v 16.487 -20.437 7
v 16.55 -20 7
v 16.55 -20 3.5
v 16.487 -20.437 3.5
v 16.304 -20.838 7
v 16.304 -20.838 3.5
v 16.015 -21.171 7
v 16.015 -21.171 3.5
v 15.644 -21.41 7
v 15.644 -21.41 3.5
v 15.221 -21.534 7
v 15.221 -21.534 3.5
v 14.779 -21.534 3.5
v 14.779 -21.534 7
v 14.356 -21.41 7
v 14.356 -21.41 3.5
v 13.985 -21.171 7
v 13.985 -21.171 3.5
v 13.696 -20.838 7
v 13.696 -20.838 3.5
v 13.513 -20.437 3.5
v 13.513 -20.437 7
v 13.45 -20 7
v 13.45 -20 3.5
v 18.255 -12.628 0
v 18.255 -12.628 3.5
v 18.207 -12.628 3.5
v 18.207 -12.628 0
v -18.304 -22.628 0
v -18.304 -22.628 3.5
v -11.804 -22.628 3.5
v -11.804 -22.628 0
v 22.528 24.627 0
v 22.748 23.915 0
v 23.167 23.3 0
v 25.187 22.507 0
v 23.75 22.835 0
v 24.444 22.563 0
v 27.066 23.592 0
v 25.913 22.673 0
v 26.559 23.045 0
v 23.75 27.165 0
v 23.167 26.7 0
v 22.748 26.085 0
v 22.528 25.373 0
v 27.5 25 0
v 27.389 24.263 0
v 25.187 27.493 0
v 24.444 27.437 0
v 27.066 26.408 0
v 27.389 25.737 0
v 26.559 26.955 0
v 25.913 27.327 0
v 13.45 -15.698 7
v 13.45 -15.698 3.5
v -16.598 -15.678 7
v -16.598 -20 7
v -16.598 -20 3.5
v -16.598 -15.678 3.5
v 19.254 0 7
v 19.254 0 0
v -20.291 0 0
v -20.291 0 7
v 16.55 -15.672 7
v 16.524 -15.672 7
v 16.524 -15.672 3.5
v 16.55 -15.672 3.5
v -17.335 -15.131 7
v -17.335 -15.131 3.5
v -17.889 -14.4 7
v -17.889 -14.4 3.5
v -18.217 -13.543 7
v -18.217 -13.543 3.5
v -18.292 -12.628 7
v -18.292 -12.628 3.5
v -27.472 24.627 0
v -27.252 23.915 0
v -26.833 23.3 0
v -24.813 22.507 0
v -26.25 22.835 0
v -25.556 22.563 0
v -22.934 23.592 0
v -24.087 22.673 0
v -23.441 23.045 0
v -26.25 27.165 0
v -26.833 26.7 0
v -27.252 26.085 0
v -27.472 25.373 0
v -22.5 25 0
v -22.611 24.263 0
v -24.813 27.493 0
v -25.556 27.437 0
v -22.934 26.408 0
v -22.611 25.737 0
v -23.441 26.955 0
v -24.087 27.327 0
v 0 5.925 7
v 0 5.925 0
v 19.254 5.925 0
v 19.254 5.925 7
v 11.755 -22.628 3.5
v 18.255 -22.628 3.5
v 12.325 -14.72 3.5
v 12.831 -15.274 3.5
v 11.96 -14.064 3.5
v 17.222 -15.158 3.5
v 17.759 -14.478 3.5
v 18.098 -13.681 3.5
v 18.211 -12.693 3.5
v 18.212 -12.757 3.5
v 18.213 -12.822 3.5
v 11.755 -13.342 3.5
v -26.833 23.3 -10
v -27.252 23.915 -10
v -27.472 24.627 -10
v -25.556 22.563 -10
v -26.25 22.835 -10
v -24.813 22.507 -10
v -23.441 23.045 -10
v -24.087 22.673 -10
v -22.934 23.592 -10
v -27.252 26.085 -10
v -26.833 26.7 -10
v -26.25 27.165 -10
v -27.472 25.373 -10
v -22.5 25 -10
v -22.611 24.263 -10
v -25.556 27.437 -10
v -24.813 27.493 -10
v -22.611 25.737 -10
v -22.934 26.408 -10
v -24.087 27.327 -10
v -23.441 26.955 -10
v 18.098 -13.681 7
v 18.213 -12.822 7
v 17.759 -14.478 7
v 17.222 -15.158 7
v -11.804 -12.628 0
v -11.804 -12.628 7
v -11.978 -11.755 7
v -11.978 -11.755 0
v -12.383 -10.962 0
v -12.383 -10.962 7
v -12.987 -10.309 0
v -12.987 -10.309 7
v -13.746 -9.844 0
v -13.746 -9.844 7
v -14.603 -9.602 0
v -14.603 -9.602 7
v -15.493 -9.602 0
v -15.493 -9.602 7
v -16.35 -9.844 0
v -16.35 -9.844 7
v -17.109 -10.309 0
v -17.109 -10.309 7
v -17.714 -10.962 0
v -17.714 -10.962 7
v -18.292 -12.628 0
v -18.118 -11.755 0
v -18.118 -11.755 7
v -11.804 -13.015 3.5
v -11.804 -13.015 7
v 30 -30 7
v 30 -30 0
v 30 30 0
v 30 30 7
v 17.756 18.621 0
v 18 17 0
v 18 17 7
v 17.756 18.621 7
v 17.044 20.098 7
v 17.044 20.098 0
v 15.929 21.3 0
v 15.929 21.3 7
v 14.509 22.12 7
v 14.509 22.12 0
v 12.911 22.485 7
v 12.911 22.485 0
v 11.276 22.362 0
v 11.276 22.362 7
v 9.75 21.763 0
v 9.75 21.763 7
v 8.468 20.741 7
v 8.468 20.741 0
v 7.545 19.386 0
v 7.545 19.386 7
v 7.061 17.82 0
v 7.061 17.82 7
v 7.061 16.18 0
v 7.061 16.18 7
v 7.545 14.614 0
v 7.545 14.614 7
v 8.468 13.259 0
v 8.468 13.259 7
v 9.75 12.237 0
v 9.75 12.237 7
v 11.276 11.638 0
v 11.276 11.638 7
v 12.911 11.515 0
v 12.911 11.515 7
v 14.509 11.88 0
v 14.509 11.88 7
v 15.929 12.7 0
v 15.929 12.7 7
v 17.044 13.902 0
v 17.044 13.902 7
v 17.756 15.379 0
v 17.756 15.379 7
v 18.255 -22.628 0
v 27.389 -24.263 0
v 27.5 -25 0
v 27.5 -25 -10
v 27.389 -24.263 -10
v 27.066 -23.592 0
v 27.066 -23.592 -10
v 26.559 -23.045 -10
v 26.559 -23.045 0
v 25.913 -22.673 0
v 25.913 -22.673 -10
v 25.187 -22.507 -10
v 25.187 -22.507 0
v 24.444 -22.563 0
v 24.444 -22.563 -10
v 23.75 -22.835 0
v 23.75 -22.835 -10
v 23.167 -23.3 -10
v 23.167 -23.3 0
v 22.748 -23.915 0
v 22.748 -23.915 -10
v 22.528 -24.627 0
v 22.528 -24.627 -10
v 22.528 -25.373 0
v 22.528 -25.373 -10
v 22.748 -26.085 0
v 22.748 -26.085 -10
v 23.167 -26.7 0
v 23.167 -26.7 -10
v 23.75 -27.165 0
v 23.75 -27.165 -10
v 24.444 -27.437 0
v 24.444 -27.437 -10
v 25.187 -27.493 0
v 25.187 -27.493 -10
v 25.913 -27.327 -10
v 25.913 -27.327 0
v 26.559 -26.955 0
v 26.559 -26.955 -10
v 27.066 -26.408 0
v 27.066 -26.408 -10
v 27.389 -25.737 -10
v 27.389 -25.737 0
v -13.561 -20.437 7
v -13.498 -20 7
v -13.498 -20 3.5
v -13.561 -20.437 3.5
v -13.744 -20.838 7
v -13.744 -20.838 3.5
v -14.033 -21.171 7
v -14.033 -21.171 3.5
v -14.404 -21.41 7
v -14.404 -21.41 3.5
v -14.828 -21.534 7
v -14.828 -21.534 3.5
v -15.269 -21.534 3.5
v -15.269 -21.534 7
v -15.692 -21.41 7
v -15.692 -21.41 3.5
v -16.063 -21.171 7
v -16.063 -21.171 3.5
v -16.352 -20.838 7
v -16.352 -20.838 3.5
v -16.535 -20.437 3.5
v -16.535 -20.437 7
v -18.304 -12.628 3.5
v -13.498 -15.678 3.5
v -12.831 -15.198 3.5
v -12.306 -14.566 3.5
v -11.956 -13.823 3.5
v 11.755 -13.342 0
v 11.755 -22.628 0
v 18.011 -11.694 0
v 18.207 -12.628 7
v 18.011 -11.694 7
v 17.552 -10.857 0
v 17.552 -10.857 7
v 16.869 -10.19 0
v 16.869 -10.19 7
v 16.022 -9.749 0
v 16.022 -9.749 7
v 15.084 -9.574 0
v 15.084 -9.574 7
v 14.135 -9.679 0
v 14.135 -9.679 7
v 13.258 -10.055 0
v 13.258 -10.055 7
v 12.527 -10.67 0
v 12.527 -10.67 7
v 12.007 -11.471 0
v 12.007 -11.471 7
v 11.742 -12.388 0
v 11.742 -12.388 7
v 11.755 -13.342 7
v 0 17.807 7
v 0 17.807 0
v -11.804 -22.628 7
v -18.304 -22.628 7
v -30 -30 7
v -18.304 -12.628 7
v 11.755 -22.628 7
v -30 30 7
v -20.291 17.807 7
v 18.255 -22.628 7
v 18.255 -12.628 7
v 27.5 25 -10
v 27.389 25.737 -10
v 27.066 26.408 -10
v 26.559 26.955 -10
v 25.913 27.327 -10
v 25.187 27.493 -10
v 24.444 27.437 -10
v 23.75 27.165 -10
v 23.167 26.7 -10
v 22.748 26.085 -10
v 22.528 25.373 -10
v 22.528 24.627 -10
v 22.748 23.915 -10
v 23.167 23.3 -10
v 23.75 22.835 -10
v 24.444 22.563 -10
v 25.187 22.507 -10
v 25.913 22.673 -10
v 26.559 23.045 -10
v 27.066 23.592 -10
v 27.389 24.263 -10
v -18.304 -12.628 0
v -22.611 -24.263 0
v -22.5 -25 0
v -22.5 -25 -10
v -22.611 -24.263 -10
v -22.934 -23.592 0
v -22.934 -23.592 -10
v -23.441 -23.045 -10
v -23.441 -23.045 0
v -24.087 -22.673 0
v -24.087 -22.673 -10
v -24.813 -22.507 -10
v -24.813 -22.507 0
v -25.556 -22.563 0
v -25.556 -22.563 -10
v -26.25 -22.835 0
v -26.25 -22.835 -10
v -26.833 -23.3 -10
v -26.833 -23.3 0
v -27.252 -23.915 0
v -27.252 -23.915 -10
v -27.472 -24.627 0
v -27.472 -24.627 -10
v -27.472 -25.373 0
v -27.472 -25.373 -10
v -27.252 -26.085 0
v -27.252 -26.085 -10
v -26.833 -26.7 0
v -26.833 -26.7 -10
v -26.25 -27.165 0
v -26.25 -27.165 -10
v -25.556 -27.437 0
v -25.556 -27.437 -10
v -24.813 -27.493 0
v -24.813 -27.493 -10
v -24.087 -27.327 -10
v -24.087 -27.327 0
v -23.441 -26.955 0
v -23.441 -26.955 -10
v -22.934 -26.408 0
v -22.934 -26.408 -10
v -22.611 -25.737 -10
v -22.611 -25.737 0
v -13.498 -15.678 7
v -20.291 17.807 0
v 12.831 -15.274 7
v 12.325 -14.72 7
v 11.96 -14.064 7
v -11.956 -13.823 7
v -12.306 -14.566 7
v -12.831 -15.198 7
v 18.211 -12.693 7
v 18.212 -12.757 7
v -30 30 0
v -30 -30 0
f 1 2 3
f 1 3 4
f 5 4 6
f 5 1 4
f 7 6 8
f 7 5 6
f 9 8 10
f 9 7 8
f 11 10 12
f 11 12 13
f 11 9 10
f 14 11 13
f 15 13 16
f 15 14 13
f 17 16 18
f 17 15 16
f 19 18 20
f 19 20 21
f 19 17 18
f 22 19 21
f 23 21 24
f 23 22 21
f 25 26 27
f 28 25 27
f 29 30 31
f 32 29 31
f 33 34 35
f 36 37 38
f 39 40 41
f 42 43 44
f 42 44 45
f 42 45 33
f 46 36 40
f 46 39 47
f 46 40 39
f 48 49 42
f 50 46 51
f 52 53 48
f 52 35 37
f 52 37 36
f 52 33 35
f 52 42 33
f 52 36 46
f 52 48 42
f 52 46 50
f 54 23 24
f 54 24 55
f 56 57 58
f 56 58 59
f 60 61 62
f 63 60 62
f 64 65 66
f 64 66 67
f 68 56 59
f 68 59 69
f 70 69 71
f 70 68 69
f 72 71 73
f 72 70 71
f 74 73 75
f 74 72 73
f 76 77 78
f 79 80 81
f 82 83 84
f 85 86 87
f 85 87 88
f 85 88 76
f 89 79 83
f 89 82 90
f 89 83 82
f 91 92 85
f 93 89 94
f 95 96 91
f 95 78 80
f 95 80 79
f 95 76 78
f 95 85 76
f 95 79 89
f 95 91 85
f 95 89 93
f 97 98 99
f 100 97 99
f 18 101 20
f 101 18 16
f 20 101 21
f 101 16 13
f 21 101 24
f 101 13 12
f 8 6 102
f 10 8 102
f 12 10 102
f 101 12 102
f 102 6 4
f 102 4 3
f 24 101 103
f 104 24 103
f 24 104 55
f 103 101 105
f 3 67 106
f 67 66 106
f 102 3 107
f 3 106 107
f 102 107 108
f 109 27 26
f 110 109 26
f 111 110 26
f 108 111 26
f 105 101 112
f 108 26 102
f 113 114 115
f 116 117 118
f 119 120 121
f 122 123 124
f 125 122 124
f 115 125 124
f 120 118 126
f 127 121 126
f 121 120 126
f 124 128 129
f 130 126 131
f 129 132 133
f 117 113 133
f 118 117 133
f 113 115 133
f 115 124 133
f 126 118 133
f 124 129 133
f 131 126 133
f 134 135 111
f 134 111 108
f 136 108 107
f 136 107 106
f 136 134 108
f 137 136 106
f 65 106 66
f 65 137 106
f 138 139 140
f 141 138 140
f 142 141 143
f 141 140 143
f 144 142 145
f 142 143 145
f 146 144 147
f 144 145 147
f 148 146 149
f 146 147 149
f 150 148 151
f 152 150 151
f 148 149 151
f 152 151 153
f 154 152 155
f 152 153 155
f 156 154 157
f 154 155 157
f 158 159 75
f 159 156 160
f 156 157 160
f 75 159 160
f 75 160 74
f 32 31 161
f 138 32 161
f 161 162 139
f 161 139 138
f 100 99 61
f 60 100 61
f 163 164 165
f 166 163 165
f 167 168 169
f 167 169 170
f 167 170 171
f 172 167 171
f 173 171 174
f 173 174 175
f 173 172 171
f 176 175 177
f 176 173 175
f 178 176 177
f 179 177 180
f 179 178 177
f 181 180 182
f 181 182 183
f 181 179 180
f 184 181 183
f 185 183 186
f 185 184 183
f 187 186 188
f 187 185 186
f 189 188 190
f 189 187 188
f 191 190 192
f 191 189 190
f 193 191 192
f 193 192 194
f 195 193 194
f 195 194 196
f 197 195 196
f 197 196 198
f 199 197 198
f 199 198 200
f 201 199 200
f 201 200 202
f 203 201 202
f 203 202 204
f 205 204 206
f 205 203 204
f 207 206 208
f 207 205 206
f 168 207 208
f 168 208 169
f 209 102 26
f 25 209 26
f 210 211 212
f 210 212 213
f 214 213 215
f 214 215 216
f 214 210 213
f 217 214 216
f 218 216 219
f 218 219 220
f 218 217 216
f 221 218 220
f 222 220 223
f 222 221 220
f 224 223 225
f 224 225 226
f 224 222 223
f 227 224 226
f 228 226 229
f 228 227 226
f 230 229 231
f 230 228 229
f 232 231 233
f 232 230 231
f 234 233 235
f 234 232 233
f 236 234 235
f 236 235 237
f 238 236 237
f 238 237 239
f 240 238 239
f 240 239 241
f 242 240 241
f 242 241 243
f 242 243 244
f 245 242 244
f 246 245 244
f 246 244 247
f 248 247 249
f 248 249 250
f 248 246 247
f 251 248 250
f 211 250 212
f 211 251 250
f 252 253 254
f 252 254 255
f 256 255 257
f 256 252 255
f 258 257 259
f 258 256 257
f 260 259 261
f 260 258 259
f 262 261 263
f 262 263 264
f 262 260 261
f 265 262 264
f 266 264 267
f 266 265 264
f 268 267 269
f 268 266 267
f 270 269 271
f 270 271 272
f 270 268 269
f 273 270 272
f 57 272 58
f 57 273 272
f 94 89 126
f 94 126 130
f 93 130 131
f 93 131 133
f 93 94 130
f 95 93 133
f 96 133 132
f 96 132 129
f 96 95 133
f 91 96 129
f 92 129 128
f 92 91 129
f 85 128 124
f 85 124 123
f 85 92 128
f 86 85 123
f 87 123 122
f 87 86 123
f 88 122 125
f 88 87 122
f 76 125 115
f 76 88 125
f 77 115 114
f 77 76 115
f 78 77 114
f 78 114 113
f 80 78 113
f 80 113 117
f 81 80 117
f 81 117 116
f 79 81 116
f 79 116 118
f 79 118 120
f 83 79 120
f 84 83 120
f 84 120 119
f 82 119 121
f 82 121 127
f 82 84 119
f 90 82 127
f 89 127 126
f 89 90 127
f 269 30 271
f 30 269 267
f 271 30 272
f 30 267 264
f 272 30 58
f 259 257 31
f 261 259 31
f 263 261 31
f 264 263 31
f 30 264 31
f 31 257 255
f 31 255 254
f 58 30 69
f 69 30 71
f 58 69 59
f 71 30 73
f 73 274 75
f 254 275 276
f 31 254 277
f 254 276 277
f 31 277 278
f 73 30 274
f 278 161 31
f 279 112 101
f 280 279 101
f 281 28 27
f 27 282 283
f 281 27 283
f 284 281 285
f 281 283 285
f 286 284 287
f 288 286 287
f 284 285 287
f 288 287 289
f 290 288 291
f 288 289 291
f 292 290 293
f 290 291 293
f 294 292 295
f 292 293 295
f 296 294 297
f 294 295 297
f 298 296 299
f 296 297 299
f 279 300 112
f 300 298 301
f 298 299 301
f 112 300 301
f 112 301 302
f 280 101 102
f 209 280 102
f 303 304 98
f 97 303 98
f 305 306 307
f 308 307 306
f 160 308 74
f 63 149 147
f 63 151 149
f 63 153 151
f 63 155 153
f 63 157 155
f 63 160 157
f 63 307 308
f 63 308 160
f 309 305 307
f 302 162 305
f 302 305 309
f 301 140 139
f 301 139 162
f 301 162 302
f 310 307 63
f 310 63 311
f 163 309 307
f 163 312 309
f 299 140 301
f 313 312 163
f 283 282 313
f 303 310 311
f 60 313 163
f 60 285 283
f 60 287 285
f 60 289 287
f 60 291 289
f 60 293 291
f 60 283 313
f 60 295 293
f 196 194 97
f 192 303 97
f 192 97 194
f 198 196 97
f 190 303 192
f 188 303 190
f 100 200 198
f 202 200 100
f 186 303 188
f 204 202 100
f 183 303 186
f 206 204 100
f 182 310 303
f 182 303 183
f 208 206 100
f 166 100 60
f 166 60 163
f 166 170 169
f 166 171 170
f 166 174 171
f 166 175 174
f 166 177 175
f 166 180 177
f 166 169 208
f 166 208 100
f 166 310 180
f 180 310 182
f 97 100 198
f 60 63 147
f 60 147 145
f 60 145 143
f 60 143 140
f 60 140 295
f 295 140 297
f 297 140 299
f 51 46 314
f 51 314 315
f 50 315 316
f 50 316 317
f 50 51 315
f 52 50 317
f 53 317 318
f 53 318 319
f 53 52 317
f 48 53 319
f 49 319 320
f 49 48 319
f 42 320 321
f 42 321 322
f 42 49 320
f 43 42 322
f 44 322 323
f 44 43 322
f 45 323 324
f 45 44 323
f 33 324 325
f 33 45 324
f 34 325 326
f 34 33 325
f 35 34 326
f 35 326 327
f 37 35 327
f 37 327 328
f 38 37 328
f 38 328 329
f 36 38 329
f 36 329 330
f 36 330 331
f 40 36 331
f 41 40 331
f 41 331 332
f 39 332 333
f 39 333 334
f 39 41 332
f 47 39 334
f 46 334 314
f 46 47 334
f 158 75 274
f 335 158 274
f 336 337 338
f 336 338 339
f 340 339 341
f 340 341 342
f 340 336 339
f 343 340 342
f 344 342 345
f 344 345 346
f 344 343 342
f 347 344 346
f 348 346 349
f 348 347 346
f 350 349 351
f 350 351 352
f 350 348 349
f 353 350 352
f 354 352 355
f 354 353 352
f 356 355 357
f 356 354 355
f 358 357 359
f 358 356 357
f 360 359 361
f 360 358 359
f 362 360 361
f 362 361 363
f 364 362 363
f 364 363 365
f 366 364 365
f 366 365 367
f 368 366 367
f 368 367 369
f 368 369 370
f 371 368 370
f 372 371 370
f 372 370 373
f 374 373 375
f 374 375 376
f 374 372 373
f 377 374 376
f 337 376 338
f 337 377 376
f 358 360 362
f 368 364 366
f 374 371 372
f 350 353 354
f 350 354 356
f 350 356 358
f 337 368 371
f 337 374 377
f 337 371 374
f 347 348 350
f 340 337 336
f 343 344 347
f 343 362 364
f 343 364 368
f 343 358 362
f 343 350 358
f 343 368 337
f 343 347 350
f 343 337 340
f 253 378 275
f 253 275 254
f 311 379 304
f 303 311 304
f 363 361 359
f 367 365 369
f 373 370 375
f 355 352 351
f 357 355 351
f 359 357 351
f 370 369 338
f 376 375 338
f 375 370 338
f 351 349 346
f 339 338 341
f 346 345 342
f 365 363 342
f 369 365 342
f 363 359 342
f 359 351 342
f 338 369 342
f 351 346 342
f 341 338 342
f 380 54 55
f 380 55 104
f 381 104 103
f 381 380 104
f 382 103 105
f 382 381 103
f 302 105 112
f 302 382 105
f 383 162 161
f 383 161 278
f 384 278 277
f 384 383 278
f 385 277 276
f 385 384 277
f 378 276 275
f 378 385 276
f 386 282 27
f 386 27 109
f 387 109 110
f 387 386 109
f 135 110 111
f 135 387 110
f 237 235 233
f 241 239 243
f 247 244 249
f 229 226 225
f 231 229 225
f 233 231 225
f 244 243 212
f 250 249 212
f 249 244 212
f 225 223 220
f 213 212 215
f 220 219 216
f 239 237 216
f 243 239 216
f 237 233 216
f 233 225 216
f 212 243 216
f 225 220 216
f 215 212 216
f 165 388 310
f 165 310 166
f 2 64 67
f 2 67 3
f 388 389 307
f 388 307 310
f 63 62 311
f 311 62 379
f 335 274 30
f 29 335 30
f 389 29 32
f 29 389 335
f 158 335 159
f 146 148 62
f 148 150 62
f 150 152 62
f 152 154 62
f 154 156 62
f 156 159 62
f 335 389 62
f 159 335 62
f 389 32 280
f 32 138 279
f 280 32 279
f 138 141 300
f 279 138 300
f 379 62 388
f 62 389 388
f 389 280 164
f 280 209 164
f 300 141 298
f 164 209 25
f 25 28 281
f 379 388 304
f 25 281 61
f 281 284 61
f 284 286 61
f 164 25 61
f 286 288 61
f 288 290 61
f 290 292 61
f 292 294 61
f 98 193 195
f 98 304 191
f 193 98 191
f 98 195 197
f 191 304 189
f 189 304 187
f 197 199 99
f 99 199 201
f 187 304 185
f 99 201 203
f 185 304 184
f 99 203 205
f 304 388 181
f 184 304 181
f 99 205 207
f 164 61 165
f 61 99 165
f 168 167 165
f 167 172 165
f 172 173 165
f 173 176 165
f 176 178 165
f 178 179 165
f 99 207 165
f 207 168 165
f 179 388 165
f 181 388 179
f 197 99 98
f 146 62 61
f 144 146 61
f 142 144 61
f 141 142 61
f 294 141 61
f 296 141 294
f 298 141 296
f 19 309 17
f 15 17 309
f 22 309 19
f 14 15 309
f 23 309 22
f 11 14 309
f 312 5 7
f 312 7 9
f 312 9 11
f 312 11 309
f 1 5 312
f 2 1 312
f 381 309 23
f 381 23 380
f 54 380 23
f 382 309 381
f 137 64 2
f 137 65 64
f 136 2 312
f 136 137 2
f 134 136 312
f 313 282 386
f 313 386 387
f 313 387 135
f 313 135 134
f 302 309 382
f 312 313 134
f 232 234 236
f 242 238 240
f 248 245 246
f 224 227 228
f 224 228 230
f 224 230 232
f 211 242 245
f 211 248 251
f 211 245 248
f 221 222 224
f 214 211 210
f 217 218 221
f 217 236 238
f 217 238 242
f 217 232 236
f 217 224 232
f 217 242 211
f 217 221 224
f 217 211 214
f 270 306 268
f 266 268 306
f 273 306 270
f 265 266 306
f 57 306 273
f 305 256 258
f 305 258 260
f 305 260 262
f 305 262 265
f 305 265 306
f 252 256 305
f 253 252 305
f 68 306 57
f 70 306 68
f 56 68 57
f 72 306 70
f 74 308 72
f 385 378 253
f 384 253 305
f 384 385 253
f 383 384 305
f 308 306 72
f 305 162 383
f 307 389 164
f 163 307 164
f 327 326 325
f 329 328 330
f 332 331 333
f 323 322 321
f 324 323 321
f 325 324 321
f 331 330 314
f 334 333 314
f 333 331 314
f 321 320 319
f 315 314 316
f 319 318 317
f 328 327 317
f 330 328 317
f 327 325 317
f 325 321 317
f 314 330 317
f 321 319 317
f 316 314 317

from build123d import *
from build123d import SkipClean  # not in build123d's __all__

# Parameters (mm, degrees)
F0_R     = 2.5
F1_DEPTH = 10
F0_W     = 60
F0_H     = 60
F0_R_2   = 5.5
F2_DEPTH = 7
F4_DEPTH = 25
F5_DEPTH = 10
F6_DEPTH = 3.5


with BuildPart() as f1:
    # F0 (on Top) → F1 (new body)
    with BuildSketch(Plane.XY):
        with Locations((-25, 25)):
            Circle(F0_R)
    extrude(amount=-F1_DEPTH)


with BuildPart() as f1b:
    # F0 (on Top) → F1, piece 2 (new body)
    with BuildSketch(Plane.XY):
        with Locations((25, 25)):
            Circle(F0_R)
    extrude(amount=-F1_DEPTH)


with BuildPart() as f1c:
    # F0 (on Top) → F1, piece 3 (new body)
    with BuildSketch(Plane.XY):
        with Locations((25, -25)):
            Circle(F0_R)
    extrude(amount=-F1_DEPTH)


with BuildPart() as f1d:
    # F0 (on Top) → F1, piece 4 (new body)
    with BuildSketch(Plane.XY):
        with Locations((-25, -25)):
            Circle(F0_R)
    extrude(amount=-F1_DEPTH)


with BuildPart() as f2:
    # F0 (on Top) → F2 (new body)
    with BuildSketch(Plane.XY):
        Rectangle(F0_W, F0_H)
        with Locations((-25, -25)):
            Circle(F0_R, mode=Mode.SUBTRACT)
        with Locations((25, -25)):
            Circle(F0_R, mode=Mode.SUBTRACT)
        Polygon((-20.2908944339, 5.9252767824), (-20.2908944339, 17.8066082299), (0, 17.8066082299), (0, 5.9252767824), (19.2535817623, 5.9252767824), (19.2535817623, 0), (0, 0), (-20.2908944339, 0), align=None, mode=Mode.SUBTRACT)
        with Locations((-25, 25)):
            Circle(F0_R, mode=Mode.SUBTRACT)
        with Locations((12.5, 17)):
            Circle(F0_R_2, mode=Mode.SUBTRACT)
        with Locations((25, 25)):
            Circle(F0_R, mode=Mode.SUBTRACT)
        with Locations((-25, 25)):
            Circle(F0_R)
        with Locations((-25, -25)):
            Circle(F0_R)
        with Locations((25, -25)):
            Circle(F0_R)
        with Locations((25, 25)):
            Circle(F0_R)
    extrude(amount=F2_DEPTH)

    # F3 (on face) → F4 (cut)
    with BuildSketch(Plane.XY.offset(7)):
        with BuildLine():
            Line((13.45, -20), (16.55, -20))
            ThreePointArc((16.55, -20), (15, -18.45), (13.45, -20))
        make_face()
        with BuildLine():
            ThreePointArc((13.45, -20), (15, -21.55), (16.55, -20))
            Line((16.55, -20), (13.45, -20))
        make_face()
        with BuildLine():
            ThreePointArc((13.45, -20), (15, -18.45), (16.55, -20))
            Line((16.55, -20), (16.55, -15.6721474181))
            Line((16.55, -15.6721474181), (16.5244984301, -15.6721474181))
            ThreePointArc((16.5244984301, -15.6721474181), (14.9905058647, -16.0716604569), (13.45, -15.6980489747))
            Line((13.45, -15.6980489747), (13.45, -20))
        make_face()
        with BuildLine():
            ThreePointArc((11.7551134899, -13.3424973788), (12.3250504464, -14.7199468679), (13.45, -15.6980489747))
            Line((13.45, -15.6980489747), (13.45, -15.6721474181))
            Line((13.45, -15.6721474181), (16.5244984301, -15.6721474181))
            ThreePointArc((16.5244984301, -15.6721474181), (17.7592810637, -14.4782844642), (18.2131267413, -12.8217757846))
            ThreePointArc((18.2131267413, -12.8217757846), (18.2116855273, -12.7249986477), (18.2073631634, -12.6283073425))
            Line((18.2073631634, -12.6283073425), (11.7551134899, -12.6283073425))
            Line((11.7551134899, -12.6283073425), (11.7551134899, -13.3424973788))
        make_face()
        with BuildLine():
            Line((13.45, -15.6721474181), (13.45, -15.6980489747))
            ThreePointArc((13.45, -15.6980489747), (14.9905058647, -16.0716604569), (16.5244984301, -15.6721474181))
            Line((16.5244984301, -15.6721474181), (13.45, -15.6721474181))
        make_face()
        with BuildLine():
            ThreePointArc((18.2073631634, -12.6283073425), (14.6055727154, -9.5915041058), (11.7551134899, -13.3424973788))
            Line((11.7551134899, -13.3424973788), (11.7551134899, -12.6283073425))
            Line((11.7551134899, -12.6283073425), (18.2073631634, -12.6283073425))
        make_face()
        with BuildLine():
            Line((-16.5981262033, -20), (-13.4981262033, -20))
            ThreePointArc((-13.4981262033, -20), (-15.0481262033, -18.45), (-16.5981262033, -20))
        make_face()
        with BuildLine():
            ThreePointArc((-16.5981262033, -20), (-15.0481262033, -21.55), (-13.4981262033, -20))
            Line((-13.4981262033, -20), (-16.5981262033, -20))
        make_face()
        with BuildLine():
            ThreePointArc((-16.5981262033, -20), (-15.0481262033, -18.45), (-13.4981262033, -20))
            Line((-13.4981262033, -20), (-13.4981262033, -15.678347156))
            ThreePointArc((-13.4981262033, -15.678347156), (-15.0481262033, -16.0717757846), (-16.5981262033, -15.678347156))
            Line((-16.5981262033, -15.678347156), (-16.5981262033, -20))
        make_face()
        with BuildLine():
            Line((-16.5981262033, -15.678347156), (-13.4981262033, -15.678347156))
            ThreePointArc((-13.4981262033, -15.678347156), (-12.3060093165, -14.5662800062), (-11.8038897812, -13.0152442266))
            Line((-11.8038897812, -13.0152442266), (-11.8038897812, -12.6283073425))
            Line((-11.8038897812, -12.6283073425), (-18.2923626253, -12.6283073425))
            ThreePointArc((-18.2923626253, -12.6283073425), (-17.8892283544, -14.3999514929), (-16.5981262033, -15.678347156))
        make_face()
        with BuildLine():
            ThreePointArc((-16.5981262033, -15.678347156), (-15.0481262033, -16.0717757846), (-13.4981262033, -15.678347156))
            Line((-13.4981262033, -15.678347156), (-16.5981262033, -15.678347156))
        make_face()
    extrude(amount=-F4_DEPTH, mode=Mode.SUBTRACT)

    # F3 (on face) → F5 (cut)
    with BuildSketch(Plane.XY.offset(7)):
        with BuildLine():
            Line((16.55, -15.6721474181), (16.55, -20))
            ThreePointArc((16.55, -20), (15, -21.55), (13.45, -20))
            Line((13.45, -20), (13.45, -15.6980489747))
            ThreePointArc((13.45, -15.6980489747), (12.3250504464, -14.7199468679), (11.7551134899, -13.3424973788))
            Line((11.7551134899, -13.3424973788), (11.7551134899, -22.6283073425))
            Line((11.7551134899, -22.6283073425), (18.2551134899, -22.6283073425))
            Line((18.2551134899, -22.6283073425), (18.2551134899, -12.6283073425))
            Line((18.2551134899, -12.6283073425), (18.2073631634, -12.6283073425))
            ThreePointArc((18.2073631634, -12.6283073425), (18.2116855273, -12.7249986477), (18.2131267413, -12.8217757846))
            ThreePointArc((18.2131267413, -12.8217757846), (17.7592810637, -14.4782844642), (16.5244984301, -15.6721474181))
            Line((16.5244984301, -15.6721474181), (16.55, -15.6721474181))
        make_face()
        with BuildLine():
            Line((-13.4981262033, -15.678347156), (-13.4981262033, -20))
            ThreePointArc((-13.4981262033, -20), (-15.0481262033, -21.55), (-16.5981262033, -20))
            Line((-16.5981262033, -20), (-16.5981262033, -15.678347156))
            ThreePointArc((-16.5981262033, -15.678347156), (-17.8892283544, -14.3999514929), (-18.2923626253, -12.6283073425))
            Line((-18.2923626253, -12.6283073425), (-18.3038897812, -12.6283073425))
            Line((-18.3038897812, -12.6283073425), (-18.3038897812, -22.6283073425))
            Line((-18.3038897812, -22.6283073425), (-11.8038897812, -22.6283073425))
            Line((-11.8038897812, -22.6283073425), (-11.8038897812, -13.0152442266))
            ThreePointArc((-11.8038897812, -13.0152442266), (-12.3060093165, -14.5662800062), (-13.4981262033, -15.678347156))
        make_face()
        with BuildLine():
            ThreePointArc((-11.8038897812, -12.6283073425), (-15.0481262033, -9.5717757846), (-18.2923626253, -12.6283073425))
            Line((-18.2923626253, -12.6283073425), (-11.8038897812, -12.6283073425))
        make_face()
    extrude(amount=-F5_DEPTH, mode=Mode.SUBTRACT)

    # F3 (on face) → F6 (join)
    with BuildSketch(Plane.XY.offset(7)):
        with BuildLine():
            Line((-13.4981262033, -15.678347156), (-13.4981262033, -20))
            ThreePointArc((-13.4981262033, -20), (-15.0481262033, -21.55), (-16.5981262033, -20))
            Line((-16.5981262033, -20), (-16.5981262033, -15.678347156))
            ThreePointArc((-16.5981262033, -15.678347156), (-17.8892283544, -14.3999514929), (-18.2923626253, -12.6283073425))
            Line((-18.2923626253, -12.6283073425), (-18.3038897812, -12.6283073425))
            Line((-18.3038897812, -12.6283073425), (-18.3038897812, -22.6283073425))
            Line((-18.3038897812, -22.6283073425), (-11.8038897812, -22.6283073425))
            Line((-11.8038897812, -22.6283073425), (-11.8038897812, -13.0152442266))
            ThreePointArc((-11.8038897812, -13.0152442266), (-12.3060093165, -14.5662800062), (-13.4981262033, -15.678347156))
        make_face()
        with BuildLine():
            Line((16.55, -15.6721474181), (16.55, -20))
            ThreePointArc((16.55, -20), (15, -21.55), (13.45, -20))
            Line((13.45, -20), (13.45, -15.6980489747))
            ThreePointArc((13.45, -15.6980489747), (12.3250504464, -14.7199468679), (11.7551134899, -13.3424973788))
            Line((11.7551134899, -13.3424973788), (11.7551134899, -22.6283073425))
            Line((11.7551134899, -22.6283073425), (18.2551134899, -22.6283073425))
            Line((18.2551134899, -22.6283073425), (18.2551134899, -12.6283073425))
            Line((18.2551134899, -12.6283073425), (18.2073631634, -12.6283073425))
            ThreePointArc((18.2073631634, -12.6283073425), (18.2116855273, -12.7249986477), (18.2131267413, -12.8217757846))
            ThreePointArc((18.2131267413, -12.8217757846), (17.7592810637, -14.4782844642), (16.5244984301, -15.6721474181))
            Line((16.5244984301, -15.6721474181), (16.55, -15.6721474181))
        make_face()
    with SkipClean():  # cleaning this boolean's faces spoils the solid; the shape is the same uncleaned
        extrude(amount=-F6_DEPTH)


solid = Compound([f1.part, f1b.part, f1c.part, f1d.part, f2.part])
